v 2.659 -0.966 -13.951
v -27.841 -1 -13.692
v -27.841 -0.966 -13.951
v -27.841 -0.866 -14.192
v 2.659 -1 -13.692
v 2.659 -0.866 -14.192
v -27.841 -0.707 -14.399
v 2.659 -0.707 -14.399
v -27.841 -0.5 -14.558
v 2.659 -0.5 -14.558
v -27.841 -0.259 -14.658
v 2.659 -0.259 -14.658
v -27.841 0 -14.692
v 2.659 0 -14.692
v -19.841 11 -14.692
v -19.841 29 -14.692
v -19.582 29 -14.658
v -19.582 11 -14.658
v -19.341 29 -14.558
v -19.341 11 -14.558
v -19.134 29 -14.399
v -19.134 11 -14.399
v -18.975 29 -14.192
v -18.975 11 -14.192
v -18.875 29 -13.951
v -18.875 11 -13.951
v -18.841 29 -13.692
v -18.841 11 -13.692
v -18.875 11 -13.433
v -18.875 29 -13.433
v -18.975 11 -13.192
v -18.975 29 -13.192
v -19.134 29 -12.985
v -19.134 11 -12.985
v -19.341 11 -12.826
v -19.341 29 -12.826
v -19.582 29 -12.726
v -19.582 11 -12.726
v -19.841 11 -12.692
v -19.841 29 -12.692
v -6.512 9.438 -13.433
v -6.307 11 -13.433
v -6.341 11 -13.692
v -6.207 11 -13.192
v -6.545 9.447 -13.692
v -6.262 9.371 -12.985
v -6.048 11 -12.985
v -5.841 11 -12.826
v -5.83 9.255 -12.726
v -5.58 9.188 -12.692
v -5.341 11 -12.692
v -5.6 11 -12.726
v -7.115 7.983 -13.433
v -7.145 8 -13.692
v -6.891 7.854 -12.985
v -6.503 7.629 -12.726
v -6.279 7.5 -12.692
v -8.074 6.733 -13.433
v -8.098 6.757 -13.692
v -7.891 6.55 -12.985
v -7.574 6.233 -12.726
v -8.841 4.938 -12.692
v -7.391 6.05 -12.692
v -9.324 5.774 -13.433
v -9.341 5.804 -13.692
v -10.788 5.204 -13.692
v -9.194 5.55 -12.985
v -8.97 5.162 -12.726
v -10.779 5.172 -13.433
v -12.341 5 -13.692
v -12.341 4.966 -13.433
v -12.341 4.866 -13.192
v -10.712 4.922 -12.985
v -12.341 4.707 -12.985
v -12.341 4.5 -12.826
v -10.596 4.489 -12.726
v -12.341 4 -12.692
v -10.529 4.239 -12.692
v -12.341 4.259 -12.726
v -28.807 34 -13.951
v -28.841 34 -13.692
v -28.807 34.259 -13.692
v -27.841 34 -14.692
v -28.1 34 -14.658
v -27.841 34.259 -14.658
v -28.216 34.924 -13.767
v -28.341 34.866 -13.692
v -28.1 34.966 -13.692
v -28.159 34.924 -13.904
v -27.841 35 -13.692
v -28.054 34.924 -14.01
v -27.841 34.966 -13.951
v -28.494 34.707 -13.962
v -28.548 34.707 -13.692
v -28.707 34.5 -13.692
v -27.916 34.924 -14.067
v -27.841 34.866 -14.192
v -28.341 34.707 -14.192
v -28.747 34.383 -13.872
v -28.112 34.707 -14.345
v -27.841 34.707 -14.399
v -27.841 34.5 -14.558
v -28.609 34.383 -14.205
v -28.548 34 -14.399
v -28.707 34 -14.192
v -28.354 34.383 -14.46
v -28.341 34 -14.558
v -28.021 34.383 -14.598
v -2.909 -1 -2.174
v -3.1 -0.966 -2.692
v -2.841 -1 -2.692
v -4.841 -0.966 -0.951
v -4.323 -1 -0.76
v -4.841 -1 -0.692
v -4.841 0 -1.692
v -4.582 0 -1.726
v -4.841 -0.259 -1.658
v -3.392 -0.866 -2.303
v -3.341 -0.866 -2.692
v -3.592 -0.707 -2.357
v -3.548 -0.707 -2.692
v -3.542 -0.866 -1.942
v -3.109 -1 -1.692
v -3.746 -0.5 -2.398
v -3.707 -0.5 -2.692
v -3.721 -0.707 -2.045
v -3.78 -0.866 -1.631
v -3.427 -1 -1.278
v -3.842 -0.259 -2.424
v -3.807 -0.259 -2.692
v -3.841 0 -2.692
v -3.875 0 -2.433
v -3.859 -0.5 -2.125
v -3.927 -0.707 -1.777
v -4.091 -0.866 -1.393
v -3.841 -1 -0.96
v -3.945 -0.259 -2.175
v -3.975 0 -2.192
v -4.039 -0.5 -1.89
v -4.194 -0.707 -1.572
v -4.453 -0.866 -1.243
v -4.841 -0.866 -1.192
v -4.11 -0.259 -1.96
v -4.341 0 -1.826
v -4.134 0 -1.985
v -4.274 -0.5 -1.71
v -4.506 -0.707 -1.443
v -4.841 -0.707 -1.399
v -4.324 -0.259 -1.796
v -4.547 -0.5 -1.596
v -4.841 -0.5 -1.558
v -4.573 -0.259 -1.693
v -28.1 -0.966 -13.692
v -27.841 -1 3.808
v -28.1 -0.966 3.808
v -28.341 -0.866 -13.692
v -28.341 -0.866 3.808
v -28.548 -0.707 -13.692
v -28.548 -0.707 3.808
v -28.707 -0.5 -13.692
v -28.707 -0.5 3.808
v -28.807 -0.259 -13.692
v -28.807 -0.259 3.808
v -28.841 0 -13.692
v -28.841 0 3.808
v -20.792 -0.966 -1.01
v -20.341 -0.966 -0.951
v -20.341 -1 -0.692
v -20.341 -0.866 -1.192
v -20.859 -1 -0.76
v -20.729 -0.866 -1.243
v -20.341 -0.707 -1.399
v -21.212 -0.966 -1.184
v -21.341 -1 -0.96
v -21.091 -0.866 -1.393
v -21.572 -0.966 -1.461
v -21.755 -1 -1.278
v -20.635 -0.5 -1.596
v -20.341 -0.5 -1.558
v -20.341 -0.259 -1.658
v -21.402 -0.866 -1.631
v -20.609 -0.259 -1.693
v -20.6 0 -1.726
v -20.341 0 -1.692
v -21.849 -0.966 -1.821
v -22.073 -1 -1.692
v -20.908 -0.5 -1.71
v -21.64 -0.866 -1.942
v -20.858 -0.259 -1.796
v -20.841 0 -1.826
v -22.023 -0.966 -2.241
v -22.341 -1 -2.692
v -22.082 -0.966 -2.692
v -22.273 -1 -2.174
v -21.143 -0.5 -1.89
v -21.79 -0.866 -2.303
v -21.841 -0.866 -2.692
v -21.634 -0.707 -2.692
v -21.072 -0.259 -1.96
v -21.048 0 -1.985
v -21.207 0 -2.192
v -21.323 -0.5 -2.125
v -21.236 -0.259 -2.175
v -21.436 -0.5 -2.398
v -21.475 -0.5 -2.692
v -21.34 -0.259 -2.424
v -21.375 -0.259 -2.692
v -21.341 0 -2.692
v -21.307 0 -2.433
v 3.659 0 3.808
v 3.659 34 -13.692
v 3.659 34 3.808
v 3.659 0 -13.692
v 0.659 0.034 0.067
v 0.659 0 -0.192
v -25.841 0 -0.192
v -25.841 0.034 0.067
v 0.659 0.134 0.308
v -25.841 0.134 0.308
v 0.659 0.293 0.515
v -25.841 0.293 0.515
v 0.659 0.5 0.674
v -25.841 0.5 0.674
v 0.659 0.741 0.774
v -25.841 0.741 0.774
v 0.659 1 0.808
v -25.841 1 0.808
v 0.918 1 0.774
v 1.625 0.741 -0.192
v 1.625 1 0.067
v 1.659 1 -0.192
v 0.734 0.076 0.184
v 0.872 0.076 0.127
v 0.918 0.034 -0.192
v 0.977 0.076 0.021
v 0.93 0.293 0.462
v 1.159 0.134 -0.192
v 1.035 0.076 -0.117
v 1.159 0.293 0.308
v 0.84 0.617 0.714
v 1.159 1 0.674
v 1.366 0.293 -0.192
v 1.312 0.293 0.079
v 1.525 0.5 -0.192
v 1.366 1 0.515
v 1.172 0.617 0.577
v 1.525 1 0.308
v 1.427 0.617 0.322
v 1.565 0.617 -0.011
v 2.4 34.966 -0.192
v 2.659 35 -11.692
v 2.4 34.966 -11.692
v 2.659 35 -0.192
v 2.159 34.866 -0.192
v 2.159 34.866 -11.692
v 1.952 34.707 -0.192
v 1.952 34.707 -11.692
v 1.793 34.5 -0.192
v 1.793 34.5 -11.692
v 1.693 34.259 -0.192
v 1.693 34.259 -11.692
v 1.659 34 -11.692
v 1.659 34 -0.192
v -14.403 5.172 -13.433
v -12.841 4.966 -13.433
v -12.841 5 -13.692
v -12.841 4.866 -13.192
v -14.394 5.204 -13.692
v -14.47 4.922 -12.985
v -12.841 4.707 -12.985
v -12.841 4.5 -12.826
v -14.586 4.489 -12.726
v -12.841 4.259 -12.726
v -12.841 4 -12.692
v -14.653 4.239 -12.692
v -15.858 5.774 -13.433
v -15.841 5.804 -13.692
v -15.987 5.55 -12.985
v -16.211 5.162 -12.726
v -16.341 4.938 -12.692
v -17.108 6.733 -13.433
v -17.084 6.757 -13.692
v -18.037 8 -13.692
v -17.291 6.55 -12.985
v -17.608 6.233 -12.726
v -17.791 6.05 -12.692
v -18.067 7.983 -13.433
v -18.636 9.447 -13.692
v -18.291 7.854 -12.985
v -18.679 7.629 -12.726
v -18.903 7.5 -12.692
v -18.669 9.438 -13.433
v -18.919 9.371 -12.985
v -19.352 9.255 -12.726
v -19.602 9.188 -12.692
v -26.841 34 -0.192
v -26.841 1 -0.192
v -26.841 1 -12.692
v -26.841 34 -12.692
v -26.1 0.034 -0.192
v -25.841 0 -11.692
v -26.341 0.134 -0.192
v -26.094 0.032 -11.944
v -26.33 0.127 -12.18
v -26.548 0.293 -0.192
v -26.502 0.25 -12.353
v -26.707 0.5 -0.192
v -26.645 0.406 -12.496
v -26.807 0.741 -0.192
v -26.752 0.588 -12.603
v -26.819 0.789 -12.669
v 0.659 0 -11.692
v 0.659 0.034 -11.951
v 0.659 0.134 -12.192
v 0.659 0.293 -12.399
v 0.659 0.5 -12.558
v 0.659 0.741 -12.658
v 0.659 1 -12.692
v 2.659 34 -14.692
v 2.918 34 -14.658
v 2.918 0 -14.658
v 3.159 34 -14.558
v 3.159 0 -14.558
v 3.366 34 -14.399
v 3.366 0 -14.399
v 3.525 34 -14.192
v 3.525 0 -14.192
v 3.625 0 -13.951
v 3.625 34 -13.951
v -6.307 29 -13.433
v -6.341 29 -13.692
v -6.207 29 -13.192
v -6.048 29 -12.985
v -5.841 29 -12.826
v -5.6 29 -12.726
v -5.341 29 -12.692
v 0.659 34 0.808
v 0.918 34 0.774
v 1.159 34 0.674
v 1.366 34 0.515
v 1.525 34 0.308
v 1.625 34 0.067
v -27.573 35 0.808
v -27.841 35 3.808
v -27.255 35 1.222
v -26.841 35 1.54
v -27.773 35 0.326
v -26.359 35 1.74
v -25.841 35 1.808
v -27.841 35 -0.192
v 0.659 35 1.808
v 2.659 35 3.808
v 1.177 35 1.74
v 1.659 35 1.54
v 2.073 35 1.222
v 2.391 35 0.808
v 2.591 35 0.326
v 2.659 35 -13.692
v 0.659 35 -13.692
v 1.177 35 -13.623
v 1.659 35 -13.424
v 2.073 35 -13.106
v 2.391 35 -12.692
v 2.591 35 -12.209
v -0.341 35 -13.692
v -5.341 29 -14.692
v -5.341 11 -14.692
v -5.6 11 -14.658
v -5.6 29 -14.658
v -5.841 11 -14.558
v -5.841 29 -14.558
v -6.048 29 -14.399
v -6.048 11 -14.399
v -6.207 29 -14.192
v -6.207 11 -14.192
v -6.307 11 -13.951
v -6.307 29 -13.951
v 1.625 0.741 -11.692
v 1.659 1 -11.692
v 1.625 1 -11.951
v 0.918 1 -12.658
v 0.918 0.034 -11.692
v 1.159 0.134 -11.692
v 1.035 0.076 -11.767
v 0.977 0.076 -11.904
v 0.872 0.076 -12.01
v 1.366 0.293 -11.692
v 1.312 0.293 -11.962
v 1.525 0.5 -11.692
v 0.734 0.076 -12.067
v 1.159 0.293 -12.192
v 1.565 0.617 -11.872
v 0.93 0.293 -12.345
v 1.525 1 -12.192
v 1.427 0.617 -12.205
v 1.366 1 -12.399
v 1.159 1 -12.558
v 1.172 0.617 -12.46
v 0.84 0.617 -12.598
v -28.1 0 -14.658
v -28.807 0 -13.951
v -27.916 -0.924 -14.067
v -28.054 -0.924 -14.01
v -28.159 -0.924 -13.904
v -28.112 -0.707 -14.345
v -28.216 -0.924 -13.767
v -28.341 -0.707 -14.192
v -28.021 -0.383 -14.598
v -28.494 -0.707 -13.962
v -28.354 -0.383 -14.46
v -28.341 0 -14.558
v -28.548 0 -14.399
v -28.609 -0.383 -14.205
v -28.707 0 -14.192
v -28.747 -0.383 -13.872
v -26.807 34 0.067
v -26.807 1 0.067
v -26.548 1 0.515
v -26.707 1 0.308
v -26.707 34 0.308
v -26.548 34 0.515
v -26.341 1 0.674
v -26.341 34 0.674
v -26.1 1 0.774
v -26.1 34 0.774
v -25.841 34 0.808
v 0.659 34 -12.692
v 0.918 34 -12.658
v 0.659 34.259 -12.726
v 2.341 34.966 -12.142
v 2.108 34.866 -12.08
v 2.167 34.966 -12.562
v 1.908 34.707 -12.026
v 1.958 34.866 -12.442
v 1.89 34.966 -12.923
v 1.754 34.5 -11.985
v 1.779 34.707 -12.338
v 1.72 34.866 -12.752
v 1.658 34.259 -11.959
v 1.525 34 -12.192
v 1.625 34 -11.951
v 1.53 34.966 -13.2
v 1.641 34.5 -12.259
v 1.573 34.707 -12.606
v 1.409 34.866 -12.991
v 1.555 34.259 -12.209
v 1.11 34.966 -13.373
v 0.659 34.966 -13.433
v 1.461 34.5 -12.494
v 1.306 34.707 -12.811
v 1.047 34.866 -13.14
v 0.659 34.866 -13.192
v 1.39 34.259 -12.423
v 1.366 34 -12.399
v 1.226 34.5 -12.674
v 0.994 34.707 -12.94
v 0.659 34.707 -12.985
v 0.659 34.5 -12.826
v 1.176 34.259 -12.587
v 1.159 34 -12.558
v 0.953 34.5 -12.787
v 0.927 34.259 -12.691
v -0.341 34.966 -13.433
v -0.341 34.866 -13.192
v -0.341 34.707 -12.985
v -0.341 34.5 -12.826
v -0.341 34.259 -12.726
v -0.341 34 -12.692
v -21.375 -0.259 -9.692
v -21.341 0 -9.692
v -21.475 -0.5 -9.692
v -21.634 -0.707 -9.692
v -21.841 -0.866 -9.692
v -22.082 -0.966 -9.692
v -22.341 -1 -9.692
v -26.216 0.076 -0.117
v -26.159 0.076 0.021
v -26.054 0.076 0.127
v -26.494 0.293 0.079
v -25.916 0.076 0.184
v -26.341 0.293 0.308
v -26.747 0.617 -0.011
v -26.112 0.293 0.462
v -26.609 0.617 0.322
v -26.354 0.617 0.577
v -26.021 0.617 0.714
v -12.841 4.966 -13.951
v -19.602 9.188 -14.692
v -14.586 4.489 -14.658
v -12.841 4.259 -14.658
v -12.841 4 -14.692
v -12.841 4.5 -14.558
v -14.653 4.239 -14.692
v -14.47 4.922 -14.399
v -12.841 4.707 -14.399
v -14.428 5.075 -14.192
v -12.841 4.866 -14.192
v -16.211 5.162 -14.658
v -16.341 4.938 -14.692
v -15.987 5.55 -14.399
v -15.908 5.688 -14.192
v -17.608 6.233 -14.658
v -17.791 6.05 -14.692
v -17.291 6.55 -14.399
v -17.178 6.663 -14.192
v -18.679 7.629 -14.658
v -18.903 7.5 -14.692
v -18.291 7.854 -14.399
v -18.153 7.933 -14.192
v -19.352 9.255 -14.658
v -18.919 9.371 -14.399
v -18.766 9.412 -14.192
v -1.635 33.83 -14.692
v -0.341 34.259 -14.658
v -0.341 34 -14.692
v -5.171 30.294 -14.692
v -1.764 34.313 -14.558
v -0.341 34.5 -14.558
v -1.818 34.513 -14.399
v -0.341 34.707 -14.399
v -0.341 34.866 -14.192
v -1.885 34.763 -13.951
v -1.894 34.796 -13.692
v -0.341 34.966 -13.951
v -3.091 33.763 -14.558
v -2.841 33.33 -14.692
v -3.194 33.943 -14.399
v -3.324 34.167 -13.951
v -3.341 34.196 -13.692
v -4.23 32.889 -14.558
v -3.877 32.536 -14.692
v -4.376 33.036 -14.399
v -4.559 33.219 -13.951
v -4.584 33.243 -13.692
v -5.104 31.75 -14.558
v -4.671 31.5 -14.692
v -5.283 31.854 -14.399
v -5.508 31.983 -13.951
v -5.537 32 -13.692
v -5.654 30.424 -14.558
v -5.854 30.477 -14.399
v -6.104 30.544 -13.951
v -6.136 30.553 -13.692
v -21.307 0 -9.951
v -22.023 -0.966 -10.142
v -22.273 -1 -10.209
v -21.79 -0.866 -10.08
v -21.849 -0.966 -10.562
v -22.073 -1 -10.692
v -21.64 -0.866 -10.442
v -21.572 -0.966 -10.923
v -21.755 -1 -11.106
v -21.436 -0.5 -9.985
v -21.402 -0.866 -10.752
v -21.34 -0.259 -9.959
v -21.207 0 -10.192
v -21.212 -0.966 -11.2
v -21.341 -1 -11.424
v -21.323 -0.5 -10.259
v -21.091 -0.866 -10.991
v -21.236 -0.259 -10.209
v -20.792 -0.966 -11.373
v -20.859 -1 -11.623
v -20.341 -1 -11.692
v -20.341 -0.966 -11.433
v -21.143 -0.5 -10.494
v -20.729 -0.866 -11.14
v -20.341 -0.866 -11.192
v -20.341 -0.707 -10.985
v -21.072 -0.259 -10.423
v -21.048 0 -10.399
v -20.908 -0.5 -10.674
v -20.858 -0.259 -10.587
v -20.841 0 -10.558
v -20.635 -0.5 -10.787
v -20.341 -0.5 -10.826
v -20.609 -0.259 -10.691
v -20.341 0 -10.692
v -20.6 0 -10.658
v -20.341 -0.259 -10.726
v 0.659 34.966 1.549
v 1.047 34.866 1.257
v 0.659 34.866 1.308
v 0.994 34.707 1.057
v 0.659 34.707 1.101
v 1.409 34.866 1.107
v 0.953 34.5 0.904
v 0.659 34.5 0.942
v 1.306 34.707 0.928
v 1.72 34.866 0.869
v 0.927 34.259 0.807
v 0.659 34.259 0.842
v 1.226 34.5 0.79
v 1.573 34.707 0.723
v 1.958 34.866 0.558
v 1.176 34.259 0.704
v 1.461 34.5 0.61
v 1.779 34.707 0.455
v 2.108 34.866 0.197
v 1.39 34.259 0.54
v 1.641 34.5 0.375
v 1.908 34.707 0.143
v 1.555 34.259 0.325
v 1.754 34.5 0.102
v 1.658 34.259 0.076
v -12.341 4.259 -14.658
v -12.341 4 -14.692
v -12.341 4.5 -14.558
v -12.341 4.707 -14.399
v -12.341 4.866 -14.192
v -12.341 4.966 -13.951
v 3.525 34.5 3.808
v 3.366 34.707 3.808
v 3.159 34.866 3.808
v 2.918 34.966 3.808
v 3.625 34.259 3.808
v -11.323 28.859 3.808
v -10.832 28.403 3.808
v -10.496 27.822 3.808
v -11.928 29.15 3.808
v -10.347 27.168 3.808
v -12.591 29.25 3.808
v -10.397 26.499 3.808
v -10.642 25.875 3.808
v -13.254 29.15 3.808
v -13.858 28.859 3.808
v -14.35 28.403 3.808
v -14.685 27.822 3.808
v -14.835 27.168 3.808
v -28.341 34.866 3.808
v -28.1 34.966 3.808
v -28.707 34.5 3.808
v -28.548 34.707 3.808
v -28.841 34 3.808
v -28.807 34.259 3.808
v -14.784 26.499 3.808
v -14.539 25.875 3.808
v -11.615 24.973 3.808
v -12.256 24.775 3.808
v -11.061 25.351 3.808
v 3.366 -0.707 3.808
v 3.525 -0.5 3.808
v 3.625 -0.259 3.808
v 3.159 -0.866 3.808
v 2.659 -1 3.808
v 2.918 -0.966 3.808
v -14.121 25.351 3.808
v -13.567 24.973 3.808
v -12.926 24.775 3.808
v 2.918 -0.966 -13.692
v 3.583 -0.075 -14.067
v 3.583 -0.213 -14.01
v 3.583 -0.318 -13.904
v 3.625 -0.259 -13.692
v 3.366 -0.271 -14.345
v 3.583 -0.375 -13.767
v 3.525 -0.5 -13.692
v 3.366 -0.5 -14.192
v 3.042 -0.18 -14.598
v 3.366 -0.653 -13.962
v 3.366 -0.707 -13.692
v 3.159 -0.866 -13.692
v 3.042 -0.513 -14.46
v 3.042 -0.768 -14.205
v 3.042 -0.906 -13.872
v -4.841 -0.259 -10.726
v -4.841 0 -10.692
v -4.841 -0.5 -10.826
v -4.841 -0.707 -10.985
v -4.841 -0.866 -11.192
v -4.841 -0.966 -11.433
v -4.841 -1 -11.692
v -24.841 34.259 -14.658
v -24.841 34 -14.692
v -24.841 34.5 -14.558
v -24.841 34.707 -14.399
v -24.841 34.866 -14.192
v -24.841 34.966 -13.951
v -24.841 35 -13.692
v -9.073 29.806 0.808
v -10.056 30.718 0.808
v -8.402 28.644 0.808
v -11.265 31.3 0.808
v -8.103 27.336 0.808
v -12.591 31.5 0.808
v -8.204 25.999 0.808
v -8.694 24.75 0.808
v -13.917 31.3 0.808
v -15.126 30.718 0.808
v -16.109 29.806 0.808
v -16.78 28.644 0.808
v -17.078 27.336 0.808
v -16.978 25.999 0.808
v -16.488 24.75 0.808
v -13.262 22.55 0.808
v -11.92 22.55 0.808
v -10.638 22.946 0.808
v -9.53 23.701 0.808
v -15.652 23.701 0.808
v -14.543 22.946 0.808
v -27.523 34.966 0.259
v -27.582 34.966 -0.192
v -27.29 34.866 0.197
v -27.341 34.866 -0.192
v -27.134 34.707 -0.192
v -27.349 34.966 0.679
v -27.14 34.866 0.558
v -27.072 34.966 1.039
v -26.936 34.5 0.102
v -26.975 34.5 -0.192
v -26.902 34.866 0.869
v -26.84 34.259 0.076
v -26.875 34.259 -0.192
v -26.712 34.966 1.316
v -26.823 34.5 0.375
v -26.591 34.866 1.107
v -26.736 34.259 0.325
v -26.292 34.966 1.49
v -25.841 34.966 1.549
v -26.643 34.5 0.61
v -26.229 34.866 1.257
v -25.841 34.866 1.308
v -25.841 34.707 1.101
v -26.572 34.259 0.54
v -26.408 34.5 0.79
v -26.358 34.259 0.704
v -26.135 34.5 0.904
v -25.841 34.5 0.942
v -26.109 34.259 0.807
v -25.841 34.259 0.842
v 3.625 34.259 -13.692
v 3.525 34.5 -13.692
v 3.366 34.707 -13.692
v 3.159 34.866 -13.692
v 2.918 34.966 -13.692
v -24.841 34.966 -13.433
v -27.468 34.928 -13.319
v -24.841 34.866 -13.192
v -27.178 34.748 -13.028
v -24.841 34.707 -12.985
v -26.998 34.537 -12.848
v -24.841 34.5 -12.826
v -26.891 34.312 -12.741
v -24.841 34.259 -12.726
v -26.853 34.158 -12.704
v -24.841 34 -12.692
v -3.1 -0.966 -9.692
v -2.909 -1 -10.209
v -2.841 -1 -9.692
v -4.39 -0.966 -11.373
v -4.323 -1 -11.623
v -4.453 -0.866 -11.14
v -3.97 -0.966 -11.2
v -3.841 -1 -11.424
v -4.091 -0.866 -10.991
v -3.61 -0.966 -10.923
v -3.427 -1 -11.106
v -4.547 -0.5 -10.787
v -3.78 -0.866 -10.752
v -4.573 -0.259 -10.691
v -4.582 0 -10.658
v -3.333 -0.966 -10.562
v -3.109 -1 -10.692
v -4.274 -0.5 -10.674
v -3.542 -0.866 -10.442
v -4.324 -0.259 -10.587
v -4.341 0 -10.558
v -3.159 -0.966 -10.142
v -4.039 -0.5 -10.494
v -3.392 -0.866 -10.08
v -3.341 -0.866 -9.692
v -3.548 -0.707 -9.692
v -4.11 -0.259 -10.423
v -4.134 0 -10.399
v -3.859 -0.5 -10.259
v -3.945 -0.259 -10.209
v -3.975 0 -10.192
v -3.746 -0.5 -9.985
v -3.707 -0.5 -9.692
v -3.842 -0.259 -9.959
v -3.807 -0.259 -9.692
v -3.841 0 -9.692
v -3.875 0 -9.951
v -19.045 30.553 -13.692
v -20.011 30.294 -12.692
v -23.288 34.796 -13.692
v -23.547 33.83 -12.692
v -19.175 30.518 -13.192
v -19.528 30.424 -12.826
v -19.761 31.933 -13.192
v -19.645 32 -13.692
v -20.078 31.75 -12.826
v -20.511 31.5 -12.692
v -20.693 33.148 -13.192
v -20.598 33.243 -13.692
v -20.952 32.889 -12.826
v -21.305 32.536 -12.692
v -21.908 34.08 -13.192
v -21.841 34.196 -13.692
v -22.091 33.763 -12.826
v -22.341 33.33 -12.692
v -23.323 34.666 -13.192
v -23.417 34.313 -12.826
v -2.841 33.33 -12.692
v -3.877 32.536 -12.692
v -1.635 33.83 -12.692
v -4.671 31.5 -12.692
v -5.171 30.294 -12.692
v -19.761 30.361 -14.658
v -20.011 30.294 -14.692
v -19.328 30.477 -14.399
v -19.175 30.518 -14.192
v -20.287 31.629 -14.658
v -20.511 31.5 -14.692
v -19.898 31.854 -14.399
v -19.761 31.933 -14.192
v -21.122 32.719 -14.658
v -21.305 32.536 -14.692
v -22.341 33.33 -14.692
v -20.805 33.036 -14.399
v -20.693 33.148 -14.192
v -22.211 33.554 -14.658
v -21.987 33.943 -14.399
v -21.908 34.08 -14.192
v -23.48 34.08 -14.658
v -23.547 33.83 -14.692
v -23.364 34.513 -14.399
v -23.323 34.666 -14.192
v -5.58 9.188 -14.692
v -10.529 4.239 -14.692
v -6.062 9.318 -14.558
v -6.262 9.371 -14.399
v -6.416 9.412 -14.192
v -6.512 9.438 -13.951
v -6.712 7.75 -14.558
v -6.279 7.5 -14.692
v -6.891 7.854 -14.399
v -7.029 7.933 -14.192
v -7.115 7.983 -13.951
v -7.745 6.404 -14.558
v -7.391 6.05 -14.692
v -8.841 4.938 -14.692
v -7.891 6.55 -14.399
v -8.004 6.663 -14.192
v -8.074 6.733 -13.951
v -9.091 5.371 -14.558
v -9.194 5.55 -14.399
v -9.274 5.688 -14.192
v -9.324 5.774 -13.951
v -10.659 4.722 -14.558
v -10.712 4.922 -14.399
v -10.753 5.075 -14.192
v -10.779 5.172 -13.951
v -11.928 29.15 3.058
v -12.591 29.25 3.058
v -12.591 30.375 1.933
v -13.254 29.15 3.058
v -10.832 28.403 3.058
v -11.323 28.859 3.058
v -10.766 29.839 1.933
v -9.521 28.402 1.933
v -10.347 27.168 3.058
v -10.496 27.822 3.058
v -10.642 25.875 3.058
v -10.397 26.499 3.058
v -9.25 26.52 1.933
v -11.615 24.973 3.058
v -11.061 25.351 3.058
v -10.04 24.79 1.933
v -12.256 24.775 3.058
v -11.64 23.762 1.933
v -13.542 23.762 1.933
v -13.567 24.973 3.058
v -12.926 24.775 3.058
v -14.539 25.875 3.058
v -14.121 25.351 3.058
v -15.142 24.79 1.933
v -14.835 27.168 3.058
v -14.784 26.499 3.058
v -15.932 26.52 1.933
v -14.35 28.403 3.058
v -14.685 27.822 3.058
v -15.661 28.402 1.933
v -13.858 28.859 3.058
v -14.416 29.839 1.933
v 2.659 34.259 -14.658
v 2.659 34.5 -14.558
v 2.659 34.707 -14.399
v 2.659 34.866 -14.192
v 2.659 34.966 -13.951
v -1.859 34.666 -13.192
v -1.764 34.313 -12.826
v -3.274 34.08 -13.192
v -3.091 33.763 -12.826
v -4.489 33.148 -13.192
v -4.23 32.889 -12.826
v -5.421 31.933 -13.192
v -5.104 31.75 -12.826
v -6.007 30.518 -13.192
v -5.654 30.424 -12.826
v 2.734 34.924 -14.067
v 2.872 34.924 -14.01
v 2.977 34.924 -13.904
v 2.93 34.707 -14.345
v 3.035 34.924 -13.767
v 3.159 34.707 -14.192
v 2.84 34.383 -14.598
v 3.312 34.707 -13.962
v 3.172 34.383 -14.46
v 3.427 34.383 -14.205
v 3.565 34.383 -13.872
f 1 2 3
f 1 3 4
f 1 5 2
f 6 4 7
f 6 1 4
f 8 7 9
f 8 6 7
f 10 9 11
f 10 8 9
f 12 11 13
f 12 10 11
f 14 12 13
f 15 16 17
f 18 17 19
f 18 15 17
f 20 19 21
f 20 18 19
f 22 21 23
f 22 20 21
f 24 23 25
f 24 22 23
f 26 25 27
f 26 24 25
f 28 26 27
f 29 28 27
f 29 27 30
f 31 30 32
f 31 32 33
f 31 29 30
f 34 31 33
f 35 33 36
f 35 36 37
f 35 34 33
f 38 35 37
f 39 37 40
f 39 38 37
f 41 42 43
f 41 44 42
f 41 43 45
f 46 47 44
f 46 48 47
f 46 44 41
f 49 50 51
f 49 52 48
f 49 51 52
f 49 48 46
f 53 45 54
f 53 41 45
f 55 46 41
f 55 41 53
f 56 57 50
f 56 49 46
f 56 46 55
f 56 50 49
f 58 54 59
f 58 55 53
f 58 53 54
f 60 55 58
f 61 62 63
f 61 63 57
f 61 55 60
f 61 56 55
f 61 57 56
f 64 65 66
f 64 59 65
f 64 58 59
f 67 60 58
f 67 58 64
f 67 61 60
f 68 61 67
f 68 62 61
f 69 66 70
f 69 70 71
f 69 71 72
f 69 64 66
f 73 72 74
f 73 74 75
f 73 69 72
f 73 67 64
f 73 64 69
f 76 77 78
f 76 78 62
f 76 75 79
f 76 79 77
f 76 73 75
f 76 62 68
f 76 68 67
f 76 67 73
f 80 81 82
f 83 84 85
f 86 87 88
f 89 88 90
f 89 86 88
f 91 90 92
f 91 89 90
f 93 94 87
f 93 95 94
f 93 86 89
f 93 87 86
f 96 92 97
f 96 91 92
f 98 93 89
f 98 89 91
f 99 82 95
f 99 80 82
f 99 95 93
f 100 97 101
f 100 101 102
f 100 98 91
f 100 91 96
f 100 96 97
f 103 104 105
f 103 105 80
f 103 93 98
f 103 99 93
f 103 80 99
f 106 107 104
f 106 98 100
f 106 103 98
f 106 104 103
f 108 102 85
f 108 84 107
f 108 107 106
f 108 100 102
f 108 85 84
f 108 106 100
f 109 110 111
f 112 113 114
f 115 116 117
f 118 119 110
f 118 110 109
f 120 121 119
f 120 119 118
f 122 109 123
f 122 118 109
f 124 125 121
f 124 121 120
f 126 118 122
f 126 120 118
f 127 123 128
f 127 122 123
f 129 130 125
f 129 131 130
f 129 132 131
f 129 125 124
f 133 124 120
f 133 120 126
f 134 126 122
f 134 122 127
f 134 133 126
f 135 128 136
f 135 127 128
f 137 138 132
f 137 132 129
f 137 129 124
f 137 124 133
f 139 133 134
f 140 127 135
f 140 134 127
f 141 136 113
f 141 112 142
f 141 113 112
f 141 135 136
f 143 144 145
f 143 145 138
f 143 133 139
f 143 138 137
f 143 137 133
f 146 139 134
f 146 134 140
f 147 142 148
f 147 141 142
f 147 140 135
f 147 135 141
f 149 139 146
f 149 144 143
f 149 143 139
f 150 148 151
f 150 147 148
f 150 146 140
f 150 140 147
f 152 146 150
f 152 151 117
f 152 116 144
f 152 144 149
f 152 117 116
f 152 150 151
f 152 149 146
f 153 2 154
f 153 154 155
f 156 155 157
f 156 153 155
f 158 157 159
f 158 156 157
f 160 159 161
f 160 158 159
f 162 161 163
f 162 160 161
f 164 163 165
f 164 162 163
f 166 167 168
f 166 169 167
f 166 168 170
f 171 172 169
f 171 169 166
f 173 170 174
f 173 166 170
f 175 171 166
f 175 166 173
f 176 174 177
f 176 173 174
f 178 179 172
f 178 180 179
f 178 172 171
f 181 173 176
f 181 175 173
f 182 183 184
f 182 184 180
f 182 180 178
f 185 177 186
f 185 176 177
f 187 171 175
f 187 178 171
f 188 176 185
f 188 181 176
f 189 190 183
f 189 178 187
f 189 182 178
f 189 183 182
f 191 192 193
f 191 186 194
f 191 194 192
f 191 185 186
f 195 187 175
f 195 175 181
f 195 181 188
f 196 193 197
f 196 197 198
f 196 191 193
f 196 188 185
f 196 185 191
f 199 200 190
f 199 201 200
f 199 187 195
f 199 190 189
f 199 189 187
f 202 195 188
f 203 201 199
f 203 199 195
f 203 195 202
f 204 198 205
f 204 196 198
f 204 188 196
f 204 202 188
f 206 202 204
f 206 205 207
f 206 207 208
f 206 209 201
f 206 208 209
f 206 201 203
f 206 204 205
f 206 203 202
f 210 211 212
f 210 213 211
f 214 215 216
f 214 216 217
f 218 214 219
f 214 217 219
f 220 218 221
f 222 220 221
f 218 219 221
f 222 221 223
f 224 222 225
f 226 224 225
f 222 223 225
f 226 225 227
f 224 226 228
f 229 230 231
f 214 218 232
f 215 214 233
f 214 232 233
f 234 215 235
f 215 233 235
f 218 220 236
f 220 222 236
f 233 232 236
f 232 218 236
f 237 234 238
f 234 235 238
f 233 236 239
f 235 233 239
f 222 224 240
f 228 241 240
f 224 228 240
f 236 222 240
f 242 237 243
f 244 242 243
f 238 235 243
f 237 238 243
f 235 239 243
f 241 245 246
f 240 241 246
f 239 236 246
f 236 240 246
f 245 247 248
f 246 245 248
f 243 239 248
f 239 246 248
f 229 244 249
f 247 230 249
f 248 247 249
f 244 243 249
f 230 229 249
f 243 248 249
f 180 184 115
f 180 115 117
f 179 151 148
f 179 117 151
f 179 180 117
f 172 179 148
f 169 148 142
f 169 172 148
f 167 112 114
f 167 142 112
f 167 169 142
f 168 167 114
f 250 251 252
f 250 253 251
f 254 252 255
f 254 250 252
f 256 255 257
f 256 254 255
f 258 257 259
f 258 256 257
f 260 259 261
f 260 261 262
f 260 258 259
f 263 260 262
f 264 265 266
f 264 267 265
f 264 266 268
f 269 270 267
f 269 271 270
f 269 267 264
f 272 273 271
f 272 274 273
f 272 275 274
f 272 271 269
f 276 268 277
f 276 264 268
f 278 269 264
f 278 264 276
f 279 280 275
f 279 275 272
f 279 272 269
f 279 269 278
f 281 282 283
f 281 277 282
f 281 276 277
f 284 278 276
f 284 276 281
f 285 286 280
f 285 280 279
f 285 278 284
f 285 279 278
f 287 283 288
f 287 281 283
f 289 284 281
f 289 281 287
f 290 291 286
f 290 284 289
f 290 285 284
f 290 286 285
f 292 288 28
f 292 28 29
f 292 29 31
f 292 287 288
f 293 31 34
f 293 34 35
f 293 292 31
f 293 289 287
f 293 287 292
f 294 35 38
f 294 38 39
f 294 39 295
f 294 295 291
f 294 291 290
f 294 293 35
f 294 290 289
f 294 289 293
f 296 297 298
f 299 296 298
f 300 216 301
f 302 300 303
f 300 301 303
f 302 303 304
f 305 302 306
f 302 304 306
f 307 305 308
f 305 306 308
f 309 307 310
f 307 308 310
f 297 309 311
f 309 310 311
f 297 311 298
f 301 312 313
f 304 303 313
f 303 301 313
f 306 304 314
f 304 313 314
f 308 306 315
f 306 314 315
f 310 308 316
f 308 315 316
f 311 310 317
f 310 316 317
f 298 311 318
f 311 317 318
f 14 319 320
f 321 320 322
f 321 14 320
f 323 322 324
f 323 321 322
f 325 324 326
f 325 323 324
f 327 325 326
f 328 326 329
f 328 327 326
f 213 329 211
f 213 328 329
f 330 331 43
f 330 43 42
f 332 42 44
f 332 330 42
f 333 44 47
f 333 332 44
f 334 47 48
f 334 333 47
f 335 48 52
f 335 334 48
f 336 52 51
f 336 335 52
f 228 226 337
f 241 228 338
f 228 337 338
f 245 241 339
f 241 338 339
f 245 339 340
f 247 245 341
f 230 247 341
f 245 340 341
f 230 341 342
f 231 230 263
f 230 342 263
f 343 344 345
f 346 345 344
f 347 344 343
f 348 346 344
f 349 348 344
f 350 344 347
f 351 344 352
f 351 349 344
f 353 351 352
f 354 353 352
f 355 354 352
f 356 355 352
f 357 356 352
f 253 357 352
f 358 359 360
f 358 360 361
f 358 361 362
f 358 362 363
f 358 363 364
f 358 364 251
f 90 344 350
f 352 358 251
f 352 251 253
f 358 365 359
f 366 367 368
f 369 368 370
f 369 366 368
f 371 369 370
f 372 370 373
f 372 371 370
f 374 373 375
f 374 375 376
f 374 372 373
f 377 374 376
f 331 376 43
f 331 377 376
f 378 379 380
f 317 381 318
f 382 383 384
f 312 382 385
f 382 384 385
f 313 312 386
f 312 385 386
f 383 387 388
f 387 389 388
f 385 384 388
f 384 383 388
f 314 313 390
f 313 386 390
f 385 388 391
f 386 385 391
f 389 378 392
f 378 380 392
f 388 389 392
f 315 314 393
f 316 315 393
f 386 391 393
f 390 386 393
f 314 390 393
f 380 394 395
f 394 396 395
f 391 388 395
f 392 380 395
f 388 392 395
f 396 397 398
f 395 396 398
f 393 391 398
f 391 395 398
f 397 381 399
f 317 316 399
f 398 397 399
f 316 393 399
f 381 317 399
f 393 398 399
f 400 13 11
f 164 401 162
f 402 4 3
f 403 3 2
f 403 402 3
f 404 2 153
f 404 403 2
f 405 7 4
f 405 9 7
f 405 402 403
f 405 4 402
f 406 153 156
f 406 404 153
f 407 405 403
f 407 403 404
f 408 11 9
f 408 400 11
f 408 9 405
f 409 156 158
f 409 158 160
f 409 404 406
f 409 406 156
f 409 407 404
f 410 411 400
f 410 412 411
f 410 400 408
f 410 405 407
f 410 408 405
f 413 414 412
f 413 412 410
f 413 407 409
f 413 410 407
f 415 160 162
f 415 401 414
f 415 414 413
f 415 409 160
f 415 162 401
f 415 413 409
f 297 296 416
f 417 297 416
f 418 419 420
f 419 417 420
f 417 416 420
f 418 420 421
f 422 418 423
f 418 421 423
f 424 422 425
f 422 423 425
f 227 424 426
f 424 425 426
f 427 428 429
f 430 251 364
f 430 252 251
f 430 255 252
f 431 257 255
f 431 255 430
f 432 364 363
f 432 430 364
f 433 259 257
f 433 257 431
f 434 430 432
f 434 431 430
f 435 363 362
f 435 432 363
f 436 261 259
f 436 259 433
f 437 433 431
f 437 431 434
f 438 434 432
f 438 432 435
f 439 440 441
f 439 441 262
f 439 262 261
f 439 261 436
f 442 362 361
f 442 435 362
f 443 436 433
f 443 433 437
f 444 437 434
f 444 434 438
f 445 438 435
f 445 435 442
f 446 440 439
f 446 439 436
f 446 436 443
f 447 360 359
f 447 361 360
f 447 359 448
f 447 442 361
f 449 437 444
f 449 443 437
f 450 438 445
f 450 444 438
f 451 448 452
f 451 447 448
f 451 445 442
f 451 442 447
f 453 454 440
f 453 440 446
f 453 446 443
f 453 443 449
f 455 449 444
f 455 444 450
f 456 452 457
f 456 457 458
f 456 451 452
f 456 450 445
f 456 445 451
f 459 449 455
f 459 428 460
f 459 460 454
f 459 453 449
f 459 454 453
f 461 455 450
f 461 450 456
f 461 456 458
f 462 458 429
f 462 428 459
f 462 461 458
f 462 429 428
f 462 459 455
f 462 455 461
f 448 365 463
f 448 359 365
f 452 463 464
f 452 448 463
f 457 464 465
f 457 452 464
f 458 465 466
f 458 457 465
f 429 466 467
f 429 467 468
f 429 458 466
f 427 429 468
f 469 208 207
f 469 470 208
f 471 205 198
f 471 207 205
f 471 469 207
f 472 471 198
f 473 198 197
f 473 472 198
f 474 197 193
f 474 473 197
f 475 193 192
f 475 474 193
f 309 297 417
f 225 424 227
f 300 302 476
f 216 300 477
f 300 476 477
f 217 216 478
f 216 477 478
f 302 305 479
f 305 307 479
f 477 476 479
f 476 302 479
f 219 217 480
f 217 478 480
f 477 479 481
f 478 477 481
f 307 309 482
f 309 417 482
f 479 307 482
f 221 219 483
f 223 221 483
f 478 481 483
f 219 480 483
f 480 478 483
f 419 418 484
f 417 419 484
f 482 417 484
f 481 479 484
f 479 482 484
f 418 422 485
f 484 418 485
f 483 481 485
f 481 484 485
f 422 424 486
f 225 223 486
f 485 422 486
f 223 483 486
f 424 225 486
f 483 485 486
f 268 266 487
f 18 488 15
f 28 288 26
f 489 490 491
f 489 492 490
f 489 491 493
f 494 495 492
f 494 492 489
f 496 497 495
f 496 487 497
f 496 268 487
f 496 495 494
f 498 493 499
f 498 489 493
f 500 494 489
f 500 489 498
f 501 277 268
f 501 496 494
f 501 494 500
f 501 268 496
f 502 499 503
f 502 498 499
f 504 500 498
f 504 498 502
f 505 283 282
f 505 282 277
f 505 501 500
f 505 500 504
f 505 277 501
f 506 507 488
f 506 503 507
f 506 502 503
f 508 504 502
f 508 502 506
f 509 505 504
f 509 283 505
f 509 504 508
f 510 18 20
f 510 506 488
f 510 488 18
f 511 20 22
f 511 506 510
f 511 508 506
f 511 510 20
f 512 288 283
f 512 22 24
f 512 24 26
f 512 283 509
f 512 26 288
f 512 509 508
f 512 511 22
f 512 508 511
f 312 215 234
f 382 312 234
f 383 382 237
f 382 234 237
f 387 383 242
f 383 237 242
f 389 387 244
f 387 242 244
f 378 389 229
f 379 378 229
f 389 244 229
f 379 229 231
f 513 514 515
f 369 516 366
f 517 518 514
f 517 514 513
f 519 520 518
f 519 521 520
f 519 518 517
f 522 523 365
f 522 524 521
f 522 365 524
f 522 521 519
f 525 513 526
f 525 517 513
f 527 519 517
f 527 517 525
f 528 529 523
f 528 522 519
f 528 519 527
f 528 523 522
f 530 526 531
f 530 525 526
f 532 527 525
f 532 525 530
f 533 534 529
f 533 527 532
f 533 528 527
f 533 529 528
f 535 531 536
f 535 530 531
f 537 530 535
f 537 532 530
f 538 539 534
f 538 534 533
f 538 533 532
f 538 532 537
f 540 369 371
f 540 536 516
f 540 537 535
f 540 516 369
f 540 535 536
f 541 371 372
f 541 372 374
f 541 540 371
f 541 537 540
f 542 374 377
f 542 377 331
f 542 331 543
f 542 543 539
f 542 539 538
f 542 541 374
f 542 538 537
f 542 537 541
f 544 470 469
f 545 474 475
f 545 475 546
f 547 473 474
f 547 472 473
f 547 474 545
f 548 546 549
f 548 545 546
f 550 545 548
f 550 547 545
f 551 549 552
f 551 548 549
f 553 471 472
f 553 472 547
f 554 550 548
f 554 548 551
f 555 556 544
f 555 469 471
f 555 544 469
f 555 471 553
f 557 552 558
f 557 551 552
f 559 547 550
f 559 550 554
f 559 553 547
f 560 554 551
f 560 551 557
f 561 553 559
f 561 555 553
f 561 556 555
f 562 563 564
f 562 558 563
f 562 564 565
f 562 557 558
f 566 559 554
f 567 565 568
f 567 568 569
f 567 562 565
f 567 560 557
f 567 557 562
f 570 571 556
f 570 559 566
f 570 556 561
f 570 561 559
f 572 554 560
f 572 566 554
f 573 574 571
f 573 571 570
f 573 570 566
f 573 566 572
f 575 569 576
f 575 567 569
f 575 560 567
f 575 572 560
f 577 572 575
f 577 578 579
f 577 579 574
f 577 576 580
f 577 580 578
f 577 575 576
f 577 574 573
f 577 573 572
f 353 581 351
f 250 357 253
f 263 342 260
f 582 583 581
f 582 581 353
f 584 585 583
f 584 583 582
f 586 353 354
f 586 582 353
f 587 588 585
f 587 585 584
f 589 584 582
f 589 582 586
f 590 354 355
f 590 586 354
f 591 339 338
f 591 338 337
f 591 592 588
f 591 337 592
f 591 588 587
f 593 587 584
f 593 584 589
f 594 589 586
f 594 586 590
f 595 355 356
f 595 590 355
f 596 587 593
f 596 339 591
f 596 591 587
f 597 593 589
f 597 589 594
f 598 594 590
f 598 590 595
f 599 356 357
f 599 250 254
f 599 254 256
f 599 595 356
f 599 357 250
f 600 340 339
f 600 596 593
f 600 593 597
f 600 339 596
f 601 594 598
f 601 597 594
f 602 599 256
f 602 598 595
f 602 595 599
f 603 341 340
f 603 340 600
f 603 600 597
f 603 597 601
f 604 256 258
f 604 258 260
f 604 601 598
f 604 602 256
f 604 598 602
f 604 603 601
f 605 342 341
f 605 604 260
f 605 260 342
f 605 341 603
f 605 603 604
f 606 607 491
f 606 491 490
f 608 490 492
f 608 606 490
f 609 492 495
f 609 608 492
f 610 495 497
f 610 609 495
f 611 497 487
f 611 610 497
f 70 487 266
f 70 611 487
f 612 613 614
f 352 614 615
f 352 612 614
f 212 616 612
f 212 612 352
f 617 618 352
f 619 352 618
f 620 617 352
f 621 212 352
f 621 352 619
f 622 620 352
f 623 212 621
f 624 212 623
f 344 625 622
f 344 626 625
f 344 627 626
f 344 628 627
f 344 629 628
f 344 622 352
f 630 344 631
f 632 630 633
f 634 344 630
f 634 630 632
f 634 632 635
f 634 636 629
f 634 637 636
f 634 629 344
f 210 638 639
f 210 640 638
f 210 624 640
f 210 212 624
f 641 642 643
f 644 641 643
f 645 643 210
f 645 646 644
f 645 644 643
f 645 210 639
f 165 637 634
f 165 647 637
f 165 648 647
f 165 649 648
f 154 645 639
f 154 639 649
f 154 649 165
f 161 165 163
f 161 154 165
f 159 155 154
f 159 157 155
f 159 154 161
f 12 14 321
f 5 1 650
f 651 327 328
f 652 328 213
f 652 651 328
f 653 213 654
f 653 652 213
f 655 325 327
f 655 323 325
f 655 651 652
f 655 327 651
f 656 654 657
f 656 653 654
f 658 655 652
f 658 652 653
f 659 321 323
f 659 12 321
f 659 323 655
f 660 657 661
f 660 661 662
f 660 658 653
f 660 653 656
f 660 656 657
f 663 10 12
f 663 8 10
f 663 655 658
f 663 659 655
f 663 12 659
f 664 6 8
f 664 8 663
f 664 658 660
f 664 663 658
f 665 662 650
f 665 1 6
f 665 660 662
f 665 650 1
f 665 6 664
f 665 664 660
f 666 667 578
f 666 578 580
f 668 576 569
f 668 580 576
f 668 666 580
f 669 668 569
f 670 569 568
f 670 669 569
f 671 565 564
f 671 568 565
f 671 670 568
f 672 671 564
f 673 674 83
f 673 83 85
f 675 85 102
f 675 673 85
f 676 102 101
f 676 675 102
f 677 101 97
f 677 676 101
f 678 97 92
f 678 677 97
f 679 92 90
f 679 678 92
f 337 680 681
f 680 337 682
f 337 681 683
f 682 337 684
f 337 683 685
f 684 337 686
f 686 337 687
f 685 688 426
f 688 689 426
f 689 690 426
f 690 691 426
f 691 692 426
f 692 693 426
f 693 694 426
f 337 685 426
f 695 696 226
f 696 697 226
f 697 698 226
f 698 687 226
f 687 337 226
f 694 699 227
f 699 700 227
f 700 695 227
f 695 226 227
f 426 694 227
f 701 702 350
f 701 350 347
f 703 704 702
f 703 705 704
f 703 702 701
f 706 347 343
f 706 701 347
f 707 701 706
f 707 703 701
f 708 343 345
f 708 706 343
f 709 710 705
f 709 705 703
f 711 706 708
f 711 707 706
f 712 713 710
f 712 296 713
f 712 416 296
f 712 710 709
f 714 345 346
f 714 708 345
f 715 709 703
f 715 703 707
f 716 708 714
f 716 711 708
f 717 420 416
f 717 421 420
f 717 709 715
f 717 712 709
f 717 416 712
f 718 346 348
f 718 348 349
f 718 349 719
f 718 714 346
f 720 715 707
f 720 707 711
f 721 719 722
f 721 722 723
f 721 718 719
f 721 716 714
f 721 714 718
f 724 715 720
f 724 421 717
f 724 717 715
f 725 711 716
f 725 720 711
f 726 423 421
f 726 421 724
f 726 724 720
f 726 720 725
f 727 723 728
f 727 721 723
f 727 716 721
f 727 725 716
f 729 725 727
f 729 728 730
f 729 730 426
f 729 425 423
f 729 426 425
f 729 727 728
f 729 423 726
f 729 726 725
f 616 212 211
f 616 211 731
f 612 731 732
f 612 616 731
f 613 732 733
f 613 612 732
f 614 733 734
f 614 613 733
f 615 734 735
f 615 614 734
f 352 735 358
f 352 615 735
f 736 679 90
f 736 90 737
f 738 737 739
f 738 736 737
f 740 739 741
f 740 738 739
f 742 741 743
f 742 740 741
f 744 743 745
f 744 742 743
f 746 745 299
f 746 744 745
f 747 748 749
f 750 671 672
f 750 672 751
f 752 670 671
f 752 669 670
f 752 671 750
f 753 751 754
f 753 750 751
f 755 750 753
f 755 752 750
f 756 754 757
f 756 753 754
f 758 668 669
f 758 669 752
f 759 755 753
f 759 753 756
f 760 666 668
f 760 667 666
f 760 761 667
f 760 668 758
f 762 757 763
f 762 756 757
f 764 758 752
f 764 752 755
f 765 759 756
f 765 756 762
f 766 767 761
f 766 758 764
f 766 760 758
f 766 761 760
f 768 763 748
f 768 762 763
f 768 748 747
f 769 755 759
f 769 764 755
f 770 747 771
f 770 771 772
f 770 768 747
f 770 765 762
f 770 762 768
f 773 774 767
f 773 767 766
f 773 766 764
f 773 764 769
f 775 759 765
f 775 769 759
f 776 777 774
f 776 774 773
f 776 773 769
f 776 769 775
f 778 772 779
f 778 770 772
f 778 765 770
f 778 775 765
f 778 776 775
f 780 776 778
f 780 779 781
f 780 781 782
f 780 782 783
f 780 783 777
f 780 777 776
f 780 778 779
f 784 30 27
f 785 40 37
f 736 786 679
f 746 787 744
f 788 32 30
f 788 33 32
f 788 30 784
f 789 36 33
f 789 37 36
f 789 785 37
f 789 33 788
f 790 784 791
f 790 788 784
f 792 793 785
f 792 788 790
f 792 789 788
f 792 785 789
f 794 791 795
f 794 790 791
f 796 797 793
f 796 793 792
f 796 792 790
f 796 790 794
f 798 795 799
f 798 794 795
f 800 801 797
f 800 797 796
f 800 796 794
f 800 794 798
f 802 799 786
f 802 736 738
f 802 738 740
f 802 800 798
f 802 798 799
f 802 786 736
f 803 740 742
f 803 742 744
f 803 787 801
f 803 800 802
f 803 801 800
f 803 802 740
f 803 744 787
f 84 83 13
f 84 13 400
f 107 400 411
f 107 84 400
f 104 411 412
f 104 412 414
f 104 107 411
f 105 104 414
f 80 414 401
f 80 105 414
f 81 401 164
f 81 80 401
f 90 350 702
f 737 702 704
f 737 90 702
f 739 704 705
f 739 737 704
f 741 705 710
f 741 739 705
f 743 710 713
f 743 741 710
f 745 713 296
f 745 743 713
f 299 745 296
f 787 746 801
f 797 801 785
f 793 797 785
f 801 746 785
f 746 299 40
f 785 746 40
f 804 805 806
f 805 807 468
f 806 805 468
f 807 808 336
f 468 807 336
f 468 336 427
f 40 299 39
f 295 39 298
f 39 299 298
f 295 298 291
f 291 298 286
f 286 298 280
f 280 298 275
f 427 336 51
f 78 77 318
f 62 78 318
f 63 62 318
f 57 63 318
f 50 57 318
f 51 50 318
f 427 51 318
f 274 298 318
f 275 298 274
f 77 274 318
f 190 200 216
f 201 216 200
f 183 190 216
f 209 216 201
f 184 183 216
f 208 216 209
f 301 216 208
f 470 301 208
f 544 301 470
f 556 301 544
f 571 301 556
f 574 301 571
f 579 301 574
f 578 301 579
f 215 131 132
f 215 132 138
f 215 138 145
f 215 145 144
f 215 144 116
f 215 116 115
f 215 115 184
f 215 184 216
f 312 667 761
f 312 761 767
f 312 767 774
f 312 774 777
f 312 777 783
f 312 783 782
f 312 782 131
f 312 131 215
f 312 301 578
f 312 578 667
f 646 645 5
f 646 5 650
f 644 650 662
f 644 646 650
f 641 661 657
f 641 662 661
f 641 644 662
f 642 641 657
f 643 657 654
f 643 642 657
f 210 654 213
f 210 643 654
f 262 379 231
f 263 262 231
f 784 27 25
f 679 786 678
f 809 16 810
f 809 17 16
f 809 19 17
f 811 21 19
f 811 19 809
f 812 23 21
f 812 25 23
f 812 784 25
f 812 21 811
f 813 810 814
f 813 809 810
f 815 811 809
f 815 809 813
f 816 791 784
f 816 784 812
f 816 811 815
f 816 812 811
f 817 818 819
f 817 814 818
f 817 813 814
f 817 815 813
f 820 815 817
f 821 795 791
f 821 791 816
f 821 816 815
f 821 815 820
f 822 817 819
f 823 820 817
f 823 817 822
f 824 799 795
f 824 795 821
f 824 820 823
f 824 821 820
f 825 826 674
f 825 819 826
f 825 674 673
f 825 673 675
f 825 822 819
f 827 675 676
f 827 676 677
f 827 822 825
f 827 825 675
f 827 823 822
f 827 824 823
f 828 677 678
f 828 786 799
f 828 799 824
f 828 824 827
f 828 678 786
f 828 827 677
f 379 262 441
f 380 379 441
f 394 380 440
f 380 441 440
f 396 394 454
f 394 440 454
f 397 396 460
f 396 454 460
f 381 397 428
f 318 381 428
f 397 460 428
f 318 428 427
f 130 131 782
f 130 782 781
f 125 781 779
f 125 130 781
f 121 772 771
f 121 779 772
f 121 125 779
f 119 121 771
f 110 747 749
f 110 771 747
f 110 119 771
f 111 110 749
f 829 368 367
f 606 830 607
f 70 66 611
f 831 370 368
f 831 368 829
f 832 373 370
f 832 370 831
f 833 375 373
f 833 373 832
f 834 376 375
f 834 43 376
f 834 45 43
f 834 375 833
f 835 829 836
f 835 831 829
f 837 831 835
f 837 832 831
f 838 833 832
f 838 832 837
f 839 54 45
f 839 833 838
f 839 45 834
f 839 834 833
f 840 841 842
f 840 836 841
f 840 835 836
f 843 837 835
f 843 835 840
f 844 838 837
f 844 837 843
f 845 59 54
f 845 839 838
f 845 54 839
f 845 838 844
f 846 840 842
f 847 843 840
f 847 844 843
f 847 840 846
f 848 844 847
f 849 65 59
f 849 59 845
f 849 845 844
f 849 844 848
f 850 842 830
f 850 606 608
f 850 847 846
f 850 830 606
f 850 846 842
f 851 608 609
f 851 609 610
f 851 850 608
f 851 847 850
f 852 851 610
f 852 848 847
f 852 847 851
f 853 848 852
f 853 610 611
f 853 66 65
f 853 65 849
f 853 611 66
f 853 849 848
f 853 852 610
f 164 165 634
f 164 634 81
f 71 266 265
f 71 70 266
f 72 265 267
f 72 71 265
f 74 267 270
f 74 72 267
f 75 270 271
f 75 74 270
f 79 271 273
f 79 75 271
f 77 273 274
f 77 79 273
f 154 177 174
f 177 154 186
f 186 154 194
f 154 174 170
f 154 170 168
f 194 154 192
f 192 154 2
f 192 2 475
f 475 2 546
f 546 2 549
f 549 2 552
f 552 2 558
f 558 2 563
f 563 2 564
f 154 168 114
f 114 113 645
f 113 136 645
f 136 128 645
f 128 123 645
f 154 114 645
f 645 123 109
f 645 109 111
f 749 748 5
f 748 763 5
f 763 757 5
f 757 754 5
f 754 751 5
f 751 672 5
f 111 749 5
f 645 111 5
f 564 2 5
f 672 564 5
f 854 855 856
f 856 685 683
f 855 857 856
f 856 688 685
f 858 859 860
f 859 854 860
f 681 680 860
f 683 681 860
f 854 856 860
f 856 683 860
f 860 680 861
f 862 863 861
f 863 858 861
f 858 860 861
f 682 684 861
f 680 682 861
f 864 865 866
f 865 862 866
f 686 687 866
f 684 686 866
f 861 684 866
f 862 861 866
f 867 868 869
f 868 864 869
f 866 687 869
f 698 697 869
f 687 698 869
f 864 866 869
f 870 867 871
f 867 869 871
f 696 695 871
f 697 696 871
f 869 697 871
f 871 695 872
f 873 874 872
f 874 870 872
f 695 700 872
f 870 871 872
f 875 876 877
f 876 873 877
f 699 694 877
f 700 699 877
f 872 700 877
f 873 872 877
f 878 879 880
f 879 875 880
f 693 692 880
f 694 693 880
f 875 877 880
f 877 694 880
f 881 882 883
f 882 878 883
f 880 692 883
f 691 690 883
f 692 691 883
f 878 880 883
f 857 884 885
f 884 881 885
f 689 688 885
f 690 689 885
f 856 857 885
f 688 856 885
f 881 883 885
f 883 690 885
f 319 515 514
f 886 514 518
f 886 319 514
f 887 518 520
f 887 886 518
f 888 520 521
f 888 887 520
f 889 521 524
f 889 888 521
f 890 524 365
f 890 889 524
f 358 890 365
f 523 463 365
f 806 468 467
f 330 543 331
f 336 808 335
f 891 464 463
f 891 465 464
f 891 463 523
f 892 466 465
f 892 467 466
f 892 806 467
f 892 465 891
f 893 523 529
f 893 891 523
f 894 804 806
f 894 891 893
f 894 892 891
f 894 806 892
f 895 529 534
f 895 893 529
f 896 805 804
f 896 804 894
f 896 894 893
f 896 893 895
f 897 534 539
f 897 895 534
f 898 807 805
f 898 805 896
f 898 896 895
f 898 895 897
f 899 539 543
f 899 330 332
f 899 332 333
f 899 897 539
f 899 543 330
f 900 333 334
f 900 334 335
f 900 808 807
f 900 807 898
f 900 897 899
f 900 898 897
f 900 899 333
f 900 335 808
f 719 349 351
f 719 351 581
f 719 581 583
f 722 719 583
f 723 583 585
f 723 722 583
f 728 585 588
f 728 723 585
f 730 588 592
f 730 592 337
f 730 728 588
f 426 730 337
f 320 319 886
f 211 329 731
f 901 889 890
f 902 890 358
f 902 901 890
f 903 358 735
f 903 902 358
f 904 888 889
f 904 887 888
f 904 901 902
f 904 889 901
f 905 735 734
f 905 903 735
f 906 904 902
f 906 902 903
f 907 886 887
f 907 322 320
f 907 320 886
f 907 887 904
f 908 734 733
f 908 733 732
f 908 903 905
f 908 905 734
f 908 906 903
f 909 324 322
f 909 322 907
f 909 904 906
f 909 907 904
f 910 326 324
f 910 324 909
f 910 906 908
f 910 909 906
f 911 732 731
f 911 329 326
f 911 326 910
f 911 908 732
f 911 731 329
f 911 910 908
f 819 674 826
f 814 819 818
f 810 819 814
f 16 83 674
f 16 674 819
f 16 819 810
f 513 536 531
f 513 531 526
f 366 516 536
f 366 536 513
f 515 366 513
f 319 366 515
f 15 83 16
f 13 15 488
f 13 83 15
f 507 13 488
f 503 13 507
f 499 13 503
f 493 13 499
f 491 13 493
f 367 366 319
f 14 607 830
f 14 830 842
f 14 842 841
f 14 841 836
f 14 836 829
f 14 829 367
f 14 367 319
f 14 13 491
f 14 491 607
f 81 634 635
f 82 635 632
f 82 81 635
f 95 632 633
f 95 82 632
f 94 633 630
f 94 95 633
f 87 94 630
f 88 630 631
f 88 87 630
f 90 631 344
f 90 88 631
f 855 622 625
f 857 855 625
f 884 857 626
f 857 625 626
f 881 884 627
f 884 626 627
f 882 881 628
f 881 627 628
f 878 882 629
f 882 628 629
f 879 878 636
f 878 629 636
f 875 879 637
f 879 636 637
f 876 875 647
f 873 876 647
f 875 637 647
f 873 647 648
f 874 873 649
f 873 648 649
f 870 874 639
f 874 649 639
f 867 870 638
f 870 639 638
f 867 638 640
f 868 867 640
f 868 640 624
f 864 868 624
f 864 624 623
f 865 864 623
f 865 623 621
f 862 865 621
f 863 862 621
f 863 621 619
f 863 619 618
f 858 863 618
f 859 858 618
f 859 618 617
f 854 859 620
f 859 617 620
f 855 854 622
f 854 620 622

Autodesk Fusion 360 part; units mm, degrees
sketch "Skizze1" plane through (0, 0, 0) normal (0, 1, 0) x (1, 0, 0)
  line L0 (-26.8409, 12.6917) -> (1.6591, 12.6917)
  line L1 (1.6591, 12.6917) -> (1.6591, -0.8083)
  line L2 (1.6591, -0.8083) -> (-26.8409, -0.8083)
  line L3 (-26.8409, -0.8083) -> (-26.8409, 12.6917)
  line L4 (-28.8409, 14.6917) -> (3.6591, 14.6917)
  line L5 (3.6591, 14.6917) -> (3.6591, -3.8083)
  line L6 (3.6591, -3.8083) -> (-28.8409, -3.8083)
  line L7 (-28.8409, -3.8083) -> (-28.8409, 14.6917)
  line L8 (-21.3409, 10.6917) -> (-3.8409, 10.6917)
  line L9 (-3.8409, 10.6917) -> (-3.8409, 1.6917)
  line L10 (-3.8409, 1.6917) -> (-21.3409, 1.6917)
  line L11 (-21.3409, 1.6917) -> (-21.3409, 10.6917)
  dimension "d1" = 28.5
  dimension "d2" = 13.5
  dimension "d3" = 2
  dimension "d4" = 3
  dimension "d5" = 2
  dimension "d6" = 2
  dimension "d8" = 5.5
  dimension "d9" = 5.5
  dimension "d10" = 2
  dimension "d11" = 2.5
extrude "Extrusion1" add sketch "Skizze1" along normal blind 35 contours L4 L5 L6 L7
extrude "Extrusion2" add sketch "Skizze1" against normal blind 1 contours L0 L1 L2 L3 | L4 L5 L6 L7
sketch "Skizze2" plane through (0, 0, -14.6917) normal (0, 0, -1) x (-1, 0, 0)
  line L0 (28.8409, -1) -> (28.8409, 35)
  line L1 (28.8409, 35) -> (-3.6591, 35)
  line L2 (-3.6591, 35) -> (-3.6591, -1)
  line L3 (-3.6591, -1) -> (28.8409, -1)
  line L4 (6.3409, 35) -> (18.8409, 35)
  line L5 (18.8409, 35) -> (18.8409, 5)
  line L6 (18.8409, 5) -> (6.3409, 5)
  line L7 (6.3409, 5) -> (6.3409, 35)
  line L8 (28.8409, 0) -> (-3.6591, 0)
  dimension "d16" = 10
  dimension "d17" = 10
  dimension "d18" = 5
extrude "Extrusion3" cut sketch "Skizze2" against normal blind 2 contours L1 L4 L5 L6 L7
fillet "Abrundung1" radius 6 4 edges at (-6.3409, 35, -13.6917) (-18.8409, 35, -13.6917) (-18.8409, 5, -13.6917) (-6.3409, 5, -13.6917)
fillet "Abrundung2" radius 1 43 edges at (-28.8409, 17, -14.6917) (-12.5909, -1, -14.6917) (-28.8409, -1, -5.4417) (3.6591, 17, -14.6917) (3.6591, -1, -5.4417) (-12.5909, -1, -1.6917) (-3.8409, -1, -6.1917) (-12.5909, -1, -10.6917) (-21.3409, -1, -6.1917) (1.6591, 35, -14.6917) (-4.5835, 33.2426, -14.6917) (-6.3409, 20, -14.6917) (-8.0983, 6.7574, -14.6917) (-12.5909, 5, -14.6917) (-17.0835, 6.7574, -14.6917) (-18.8409, 20, -14.6917) (-20.5983, 33.2426, -14.6917) (-26.8409, 35, -14.6917) (-28.8409, 35, -5.4417) (-26.8409, 35, -5.9417) (1.6591, 35, -5.9417) (-12.5909, 35, 0.8083) (3.6591, 35, -5.4417) (1.6591, 17.5, 0.8083) (-26.8409, 17.5, 0.8083) (-12.5909, 0, 0.8083) (1.6591, 17.5, -12.6917) (1.6591, 0, -5.9417) (-12.5909, 0, -12.6917) (-26.8409, 0, -5.9417) (-25.8409, 35, -12.6917) (-20.5983, 33.2426, -12.6917) (-18.8409, 20, -12.6917) (-17.0835, 6.7574, -12.6917) (-12.5909, 5, -12.6917) (-8.0983, 6.7574, -12.6917) (-6.3409, 20, -12.6917) (-4.5835, 33.2426, -12.6917) (0.6591, 35, -12.6917) (-3.8409, -0.5, -10.6917) (-21.3409, -0.5, -10.6917) (-21.3409, -0.5, -1.6917) (-3.8409, -0.5, -1.6917)
sketch "Skizze3" plane through (0, 0, 0.8083) normal (0, 0, -1) x (-1, 0, 0)
  line L0 (-0.6591, 1) -> (25.8409, 1)
  line L1 (25.8409, 1) -> (25.8409, 34)
  line L2 (25.8409, 34) -> (-0.6591, 34)
  line L3 (-0.6591, 34) -> (-0.6591, 1)
  line L4 (25.8409, 35) -> (-0.6591, 35)
  line L5 (-2.6591, 0) -> (-2.6591, 34)
  line L6 (27.8409, 34) -> (27.8409, 0)
  point P0 (12.5909, 27)
  dimension "d25" = 8
  dimension "d26" = 15.25
  dimension "d27" = 15.25
hole "Bohrung1" at (-12.5909, 27, 0.8083) direction (0, 0, 1) diameter 4.5 depth 25 tip angle 118 countersink diameter 9 countersink angle 90
equation "d5 = d3"
equation "d6 = d3"
equation "d17 = d16"
